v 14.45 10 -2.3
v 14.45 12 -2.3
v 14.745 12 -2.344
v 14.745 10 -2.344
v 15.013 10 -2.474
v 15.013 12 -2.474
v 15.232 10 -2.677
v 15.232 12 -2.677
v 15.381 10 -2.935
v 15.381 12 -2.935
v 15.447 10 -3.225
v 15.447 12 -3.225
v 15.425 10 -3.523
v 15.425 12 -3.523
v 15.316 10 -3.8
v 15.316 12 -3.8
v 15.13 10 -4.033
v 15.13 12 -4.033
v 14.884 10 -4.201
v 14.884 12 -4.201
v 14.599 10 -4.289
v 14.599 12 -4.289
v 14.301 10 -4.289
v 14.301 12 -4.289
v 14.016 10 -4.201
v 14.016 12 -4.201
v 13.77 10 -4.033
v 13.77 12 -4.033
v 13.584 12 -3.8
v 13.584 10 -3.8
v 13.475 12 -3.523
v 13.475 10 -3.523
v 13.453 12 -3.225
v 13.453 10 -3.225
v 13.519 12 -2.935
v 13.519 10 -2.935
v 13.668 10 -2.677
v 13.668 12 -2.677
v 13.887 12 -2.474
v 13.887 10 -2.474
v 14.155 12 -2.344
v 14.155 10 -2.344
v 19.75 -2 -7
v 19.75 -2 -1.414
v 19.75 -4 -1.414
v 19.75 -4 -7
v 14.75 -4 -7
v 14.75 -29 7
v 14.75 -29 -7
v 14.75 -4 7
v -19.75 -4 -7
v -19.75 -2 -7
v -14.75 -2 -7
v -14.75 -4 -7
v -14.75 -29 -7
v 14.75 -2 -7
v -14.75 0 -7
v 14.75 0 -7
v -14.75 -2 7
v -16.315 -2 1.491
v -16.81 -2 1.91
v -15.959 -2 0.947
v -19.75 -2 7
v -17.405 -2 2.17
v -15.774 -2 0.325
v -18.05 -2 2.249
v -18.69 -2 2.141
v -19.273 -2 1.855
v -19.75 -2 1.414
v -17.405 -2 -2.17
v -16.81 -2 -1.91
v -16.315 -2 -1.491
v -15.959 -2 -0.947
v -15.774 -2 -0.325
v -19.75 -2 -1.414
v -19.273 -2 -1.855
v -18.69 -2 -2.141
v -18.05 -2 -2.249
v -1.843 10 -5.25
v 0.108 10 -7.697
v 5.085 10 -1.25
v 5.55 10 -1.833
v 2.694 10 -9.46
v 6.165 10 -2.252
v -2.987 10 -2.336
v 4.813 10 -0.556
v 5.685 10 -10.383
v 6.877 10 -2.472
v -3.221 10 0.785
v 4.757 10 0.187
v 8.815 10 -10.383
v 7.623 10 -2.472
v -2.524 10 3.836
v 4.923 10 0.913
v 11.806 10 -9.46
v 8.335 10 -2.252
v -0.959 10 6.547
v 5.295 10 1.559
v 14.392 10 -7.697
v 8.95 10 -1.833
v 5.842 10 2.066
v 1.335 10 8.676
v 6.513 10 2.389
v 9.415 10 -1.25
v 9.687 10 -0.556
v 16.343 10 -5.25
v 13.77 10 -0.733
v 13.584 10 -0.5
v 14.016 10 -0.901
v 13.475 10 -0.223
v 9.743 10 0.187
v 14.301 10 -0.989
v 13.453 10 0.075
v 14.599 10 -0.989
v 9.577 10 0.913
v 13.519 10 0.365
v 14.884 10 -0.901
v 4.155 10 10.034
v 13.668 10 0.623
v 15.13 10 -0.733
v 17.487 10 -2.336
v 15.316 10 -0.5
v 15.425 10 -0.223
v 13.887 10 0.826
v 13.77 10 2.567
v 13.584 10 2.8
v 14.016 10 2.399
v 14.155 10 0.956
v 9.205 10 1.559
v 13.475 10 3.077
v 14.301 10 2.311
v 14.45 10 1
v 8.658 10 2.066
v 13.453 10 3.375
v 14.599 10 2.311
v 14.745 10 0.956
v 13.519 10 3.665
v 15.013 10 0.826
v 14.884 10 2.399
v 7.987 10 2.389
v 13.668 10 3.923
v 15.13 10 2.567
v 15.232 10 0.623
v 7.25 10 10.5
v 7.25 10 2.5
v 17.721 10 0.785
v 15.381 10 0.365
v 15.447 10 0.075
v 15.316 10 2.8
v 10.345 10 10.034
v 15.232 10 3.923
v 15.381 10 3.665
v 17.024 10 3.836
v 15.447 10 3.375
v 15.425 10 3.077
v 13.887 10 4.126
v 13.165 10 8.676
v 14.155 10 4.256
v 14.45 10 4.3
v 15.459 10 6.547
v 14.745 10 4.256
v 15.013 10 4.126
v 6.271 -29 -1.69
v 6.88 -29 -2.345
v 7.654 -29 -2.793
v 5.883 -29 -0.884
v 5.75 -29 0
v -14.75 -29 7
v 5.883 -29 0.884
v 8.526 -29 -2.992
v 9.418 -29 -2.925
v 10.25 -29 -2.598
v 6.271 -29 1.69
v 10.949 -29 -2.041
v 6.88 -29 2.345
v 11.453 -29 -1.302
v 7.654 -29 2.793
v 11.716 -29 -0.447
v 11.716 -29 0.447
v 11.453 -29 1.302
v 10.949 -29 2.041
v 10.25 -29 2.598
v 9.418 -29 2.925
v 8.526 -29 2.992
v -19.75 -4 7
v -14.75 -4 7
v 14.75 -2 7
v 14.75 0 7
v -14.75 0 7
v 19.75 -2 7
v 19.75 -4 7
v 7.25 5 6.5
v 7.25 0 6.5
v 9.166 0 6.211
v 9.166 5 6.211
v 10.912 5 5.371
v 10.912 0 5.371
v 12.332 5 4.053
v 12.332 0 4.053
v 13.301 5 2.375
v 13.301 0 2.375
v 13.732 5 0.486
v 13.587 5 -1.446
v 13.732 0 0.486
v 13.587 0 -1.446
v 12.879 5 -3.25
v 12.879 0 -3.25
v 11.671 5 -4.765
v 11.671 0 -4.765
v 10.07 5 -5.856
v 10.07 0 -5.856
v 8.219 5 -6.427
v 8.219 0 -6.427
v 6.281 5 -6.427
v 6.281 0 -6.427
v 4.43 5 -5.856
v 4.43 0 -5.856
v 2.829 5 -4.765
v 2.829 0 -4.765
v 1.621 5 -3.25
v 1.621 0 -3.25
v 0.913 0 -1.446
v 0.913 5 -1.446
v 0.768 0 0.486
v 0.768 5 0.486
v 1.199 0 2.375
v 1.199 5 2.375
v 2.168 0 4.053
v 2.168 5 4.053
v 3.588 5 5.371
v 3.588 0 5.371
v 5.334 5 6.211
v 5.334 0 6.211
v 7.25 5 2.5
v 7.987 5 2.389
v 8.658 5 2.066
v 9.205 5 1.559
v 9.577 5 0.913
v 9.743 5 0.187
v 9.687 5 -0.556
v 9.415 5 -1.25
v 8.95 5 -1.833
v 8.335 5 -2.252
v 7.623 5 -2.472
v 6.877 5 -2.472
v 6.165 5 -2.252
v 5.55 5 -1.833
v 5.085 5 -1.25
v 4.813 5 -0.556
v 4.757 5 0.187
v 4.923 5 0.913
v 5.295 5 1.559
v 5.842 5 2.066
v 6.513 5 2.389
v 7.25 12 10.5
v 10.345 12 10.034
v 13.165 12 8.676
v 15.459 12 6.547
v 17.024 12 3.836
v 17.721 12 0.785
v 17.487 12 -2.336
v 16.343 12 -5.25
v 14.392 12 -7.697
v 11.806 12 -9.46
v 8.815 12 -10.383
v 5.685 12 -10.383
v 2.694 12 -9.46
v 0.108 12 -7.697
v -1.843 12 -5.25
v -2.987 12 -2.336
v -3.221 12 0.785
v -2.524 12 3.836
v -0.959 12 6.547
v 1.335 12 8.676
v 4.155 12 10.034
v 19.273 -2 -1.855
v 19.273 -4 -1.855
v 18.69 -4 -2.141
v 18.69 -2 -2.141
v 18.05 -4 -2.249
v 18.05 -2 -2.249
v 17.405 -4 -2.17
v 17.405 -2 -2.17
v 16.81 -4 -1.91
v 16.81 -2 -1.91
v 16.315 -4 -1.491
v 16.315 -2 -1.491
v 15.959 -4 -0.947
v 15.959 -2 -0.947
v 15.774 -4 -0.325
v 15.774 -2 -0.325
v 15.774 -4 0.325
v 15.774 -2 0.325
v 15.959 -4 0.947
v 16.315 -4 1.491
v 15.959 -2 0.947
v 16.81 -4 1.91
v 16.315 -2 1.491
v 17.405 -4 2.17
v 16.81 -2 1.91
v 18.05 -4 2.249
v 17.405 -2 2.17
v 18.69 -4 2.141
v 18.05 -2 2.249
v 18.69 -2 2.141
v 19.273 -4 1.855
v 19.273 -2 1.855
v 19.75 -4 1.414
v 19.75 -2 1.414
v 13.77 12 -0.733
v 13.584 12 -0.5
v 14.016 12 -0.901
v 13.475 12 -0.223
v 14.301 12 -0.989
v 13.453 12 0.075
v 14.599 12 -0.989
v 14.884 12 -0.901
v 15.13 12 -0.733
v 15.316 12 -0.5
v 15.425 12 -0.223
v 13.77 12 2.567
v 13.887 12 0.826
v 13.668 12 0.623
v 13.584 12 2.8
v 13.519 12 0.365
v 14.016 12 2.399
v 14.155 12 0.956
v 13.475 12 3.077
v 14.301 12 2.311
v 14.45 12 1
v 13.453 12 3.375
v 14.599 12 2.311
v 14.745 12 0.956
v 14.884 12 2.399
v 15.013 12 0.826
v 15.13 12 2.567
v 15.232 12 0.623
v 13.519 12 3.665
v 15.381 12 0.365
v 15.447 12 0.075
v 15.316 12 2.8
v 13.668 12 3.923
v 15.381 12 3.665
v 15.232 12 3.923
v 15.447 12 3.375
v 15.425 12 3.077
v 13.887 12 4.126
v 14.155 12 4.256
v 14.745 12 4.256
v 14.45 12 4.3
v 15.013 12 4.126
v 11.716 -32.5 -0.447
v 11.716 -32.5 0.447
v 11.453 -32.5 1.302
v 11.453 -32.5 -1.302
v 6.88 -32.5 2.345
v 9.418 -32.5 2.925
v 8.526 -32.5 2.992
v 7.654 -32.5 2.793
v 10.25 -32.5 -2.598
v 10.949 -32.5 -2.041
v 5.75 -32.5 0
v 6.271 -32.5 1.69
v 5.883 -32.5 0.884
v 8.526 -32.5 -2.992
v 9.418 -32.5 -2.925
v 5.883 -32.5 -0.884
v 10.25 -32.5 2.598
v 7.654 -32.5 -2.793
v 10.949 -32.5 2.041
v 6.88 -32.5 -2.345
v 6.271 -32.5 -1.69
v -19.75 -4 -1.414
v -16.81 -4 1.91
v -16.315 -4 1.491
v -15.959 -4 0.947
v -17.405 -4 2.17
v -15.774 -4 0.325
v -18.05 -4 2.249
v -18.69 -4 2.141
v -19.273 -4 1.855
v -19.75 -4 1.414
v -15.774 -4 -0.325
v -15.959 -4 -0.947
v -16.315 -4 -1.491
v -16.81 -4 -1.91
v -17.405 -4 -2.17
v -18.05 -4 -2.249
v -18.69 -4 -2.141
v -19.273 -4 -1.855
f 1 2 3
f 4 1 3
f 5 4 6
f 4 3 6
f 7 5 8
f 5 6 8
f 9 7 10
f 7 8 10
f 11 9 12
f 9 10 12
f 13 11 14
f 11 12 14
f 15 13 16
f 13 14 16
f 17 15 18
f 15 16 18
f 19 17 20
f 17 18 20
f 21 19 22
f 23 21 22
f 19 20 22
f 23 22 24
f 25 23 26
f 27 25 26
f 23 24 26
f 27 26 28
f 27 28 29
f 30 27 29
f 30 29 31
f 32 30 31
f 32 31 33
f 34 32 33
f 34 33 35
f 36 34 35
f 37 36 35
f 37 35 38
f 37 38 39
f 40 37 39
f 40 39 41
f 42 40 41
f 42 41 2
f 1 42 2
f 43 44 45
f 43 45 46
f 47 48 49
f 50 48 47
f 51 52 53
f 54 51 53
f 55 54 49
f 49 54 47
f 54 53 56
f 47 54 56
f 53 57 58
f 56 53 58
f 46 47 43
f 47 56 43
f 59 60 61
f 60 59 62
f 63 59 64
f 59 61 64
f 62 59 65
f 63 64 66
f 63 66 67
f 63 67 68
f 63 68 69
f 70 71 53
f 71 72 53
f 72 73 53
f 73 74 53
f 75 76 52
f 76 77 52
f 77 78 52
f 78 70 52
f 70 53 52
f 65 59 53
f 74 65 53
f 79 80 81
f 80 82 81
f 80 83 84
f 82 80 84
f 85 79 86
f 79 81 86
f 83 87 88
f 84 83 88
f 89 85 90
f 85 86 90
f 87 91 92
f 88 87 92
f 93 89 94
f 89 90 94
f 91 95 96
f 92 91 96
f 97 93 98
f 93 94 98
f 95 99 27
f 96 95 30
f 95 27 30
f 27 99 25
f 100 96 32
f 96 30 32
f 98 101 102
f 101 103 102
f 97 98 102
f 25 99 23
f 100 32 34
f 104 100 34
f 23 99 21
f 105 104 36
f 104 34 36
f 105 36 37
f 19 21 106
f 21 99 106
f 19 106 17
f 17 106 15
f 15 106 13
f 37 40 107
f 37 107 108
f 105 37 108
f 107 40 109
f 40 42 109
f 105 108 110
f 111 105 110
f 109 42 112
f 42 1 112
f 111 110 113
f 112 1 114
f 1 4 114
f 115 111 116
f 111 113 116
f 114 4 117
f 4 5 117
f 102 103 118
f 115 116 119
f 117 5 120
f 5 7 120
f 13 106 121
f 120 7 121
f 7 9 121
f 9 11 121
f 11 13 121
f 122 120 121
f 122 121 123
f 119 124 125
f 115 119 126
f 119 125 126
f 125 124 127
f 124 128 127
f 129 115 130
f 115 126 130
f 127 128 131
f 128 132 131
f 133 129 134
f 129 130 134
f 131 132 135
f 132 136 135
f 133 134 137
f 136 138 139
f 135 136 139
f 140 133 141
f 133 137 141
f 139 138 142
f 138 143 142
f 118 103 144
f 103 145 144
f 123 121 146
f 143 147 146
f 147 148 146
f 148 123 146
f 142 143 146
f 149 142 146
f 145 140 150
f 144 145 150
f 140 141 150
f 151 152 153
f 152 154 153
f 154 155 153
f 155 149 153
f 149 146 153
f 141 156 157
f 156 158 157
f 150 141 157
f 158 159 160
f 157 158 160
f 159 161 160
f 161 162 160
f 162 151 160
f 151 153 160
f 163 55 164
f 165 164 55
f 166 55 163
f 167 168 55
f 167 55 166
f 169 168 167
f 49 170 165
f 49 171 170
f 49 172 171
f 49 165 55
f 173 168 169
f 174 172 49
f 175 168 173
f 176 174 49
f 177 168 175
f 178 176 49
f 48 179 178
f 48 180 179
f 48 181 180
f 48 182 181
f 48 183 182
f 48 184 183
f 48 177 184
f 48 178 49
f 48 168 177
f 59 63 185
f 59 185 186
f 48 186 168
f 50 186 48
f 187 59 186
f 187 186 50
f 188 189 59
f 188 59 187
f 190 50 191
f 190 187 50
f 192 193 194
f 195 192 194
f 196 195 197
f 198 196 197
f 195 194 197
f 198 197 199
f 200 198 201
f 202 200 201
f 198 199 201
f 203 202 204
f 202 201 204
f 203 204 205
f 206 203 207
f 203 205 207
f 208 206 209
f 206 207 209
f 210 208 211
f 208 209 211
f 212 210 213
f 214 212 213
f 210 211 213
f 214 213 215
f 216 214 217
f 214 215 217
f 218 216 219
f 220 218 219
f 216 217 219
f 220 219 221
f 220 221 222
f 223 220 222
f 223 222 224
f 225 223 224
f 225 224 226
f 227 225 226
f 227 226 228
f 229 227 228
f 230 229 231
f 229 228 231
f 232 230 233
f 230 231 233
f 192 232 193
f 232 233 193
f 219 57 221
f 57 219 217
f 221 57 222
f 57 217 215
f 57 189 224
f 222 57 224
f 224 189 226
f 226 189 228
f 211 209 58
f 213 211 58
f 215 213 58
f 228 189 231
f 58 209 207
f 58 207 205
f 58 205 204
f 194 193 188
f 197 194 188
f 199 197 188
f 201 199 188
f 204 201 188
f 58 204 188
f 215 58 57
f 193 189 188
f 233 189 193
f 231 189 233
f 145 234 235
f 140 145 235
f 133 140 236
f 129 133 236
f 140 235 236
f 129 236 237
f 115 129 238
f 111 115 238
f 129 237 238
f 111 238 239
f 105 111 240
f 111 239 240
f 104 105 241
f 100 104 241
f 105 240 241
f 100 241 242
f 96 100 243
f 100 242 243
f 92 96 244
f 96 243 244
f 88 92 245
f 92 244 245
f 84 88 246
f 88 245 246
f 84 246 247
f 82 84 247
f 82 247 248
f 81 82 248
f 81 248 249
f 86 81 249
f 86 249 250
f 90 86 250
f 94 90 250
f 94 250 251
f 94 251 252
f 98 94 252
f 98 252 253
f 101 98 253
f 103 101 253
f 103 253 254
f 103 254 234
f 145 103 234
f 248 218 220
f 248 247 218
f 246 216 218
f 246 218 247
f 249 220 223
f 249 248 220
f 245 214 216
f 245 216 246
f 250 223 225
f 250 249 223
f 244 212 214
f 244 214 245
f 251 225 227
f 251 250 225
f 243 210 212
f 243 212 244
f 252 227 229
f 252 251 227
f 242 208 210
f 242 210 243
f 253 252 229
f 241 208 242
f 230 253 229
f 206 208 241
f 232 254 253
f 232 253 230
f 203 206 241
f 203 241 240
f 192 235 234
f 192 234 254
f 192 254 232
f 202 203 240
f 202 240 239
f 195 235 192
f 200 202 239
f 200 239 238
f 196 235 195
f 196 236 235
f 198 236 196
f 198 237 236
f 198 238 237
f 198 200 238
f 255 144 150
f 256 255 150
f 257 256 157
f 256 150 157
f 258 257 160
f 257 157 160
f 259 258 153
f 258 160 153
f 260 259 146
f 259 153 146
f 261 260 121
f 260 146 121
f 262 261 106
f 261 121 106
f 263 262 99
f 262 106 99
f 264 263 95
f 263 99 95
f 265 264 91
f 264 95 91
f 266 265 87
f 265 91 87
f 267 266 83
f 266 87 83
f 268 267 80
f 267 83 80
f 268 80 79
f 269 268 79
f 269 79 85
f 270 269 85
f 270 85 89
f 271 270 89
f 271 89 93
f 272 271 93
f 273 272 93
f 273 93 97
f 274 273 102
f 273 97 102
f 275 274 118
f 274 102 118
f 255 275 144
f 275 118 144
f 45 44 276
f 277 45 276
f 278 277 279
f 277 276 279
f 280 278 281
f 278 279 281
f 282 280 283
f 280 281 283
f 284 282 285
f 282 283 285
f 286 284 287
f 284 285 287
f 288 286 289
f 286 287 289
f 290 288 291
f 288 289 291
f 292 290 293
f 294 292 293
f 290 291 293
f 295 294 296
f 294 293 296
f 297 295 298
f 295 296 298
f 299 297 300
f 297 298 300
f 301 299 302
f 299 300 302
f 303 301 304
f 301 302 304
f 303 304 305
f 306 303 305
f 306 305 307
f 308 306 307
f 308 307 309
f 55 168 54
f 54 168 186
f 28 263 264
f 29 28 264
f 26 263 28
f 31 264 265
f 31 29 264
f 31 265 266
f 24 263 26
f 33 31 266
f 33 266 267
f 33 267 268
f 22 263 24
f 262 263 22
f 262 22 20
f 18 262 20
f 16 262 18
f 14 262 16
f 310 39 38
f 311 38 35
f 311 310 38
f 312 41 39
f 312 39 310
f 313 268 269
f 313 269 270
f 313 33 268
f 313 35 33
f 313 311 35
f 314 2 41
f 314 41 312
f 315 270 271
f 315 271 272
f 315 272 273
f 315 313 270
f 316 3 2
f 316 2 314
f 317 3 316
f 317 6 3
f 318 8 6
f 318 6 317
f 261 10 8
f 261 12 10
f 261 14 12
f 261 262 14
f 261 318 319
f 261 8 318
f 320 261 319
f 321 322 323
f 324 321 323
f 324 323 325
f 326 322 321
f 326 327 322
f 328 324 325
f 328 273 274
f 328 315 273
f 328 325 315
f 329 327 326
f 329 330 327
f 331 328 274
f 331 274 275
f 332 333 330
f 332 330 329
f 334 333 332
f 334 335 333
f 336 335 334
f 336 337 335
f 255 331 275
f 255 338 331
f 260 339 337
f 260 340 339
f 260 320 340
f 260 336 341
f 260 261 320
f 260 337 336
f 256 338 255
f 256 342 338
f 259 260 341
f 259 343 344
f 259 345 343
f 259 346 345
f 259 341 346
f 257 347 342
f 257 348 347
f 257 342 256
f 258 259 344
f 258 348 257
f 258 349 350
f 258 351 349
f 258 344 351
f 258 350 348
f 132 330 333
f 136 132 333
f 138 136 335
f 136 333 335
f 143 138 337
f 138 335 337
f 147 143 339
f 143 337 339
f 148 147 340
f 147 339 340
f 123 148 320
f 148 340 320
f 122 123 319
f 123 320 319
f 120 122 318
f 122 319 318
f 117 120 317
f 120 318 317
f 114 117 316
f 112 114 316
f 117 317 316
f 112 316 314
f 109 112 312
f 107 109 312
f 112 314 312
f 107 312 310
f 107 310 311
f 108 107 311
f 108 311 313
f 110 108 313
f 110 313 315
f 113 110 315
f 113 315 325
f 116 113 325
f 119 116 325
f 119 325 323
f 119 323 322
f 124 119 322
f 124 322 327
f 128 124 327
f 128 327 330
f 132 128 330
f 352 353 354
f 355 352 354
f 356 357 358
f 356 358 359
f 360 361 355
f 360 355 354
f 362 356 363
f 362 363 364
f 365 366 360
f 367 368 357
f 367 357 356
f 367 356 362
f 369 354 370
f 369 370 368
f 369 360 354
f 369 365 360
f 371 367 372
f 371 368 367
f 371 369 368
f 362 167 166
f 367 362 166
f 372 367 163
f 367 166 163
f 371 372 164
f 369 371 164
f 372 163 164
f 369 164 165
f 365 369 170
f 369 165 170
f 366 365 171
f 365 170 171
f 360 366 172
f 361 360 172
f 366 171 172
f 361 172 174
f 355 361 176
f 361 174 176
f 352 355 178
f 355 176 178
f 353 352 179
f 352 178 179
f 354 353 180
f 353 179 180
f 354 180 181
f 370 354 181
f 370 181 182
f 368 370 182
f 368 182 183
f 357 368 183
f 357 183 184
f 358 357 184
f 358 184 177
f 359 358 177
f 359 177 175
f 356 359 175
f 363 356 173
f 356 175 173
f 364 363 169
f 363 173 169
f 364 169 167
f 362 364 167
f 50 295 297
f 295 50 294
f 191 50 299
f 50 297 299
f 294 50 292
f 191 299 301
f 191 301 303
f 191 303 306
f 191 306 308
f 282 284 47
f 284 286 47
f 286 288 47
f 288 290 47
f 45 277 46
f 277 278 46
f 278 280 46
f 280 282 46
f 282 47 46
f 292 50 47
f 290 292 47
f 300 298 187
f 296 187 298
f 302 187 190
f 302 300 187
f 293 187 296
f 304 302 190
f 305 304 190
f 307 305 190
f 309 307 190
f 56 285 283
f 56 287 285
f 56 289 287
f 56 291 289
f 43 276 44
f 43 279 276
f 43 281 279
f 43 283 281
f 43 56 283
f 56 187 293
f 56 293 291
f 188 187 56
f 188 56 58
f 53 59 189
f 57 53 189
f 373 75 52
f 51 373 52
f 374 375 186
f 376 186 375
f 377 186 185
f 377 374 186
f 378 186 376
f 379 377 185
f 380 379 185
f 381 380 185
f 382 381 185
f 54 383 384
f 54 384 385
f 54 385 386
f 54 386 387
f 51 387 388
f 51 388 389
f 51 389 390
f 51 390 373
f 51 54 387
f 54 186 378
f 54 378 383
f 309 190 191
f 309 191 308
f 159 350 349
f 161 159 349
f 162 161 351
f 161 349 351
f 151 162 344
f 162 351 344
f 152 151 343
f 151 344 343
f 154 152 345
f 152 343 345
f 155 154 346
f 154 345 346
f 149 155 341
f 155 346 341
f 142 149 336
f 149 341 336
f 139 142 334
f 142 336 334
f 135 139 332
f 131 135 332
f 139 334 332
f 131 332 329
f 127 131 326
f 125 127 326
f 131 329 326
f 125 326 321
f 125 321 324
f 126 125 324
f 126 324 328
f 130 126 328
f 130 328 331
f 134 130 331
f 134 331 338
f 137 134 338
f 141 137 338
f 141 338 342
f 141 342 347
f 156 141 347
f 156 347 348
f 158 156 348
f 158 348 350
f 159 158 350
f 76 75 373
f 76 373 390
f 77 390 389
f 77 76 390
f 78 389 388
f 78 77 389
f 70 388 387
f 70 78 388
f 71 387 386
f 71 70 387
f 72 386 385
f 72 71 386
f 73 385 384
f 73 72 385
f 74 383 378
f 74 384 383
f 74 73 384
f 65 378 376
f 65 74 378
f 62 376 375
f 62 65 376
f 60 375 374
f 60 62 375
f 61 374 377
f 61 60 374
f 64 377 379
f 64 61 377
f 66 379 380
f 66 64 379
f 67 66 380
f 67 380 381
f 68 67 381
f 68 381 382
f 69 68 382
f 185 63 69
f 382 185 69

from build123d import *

# Parameters (mm, degrees)
SKETCH_1_W          = 29.5
SKETCH_1_H          = 29
EXTRUDE_1_DEPTH     = 7
SKETCH_2_W          = 5
SKETCH_2_H          = 14
EXTRUDE_2_DEPTH     = 2
SKETCH_3_R          = 2.25
CUT_EXTRUDE_1_DEPTH = 35.176929353
SKETCH_4_R          = 6.5
SKETCH_4_R_2        = 2.5
EXTRUDE_3_DEPTH     = 5
SKETCH_5_R          = 3
EXTRUDE_4_DEPTH     = 3.5
EXTRUDE_START       = 10
SKETCH_4_3_R        = 10.5
EXTRUDE_5_DEPTH     = 2
SKETCH_4_4_R        = 2.5
EXTRUDE_6_DEPTH     = 10
CUT_EXTRUDE_2_REACH = 51.805
SKETCH_6_R          = 1


with BuildPart() as part:
    # 스케치1 → 보스-돌출1 (new, symmetric)
    with BuildSketch(Plane.XY):
        with Locations((0, -14.5)):
            Rectangle(SKETCH_1_W, SKETCH_1_H)
    extrude(amount=EXTRUDE_1_DEPTH, both=True)

    # 스케치2 → 보스-돌출2 (add)
    with BuildSketch(Plane(origin=(0, -2, 0), x_dir=(1, 0, 0), z_dir=(0, 1, 0))):
        with Locations((17.25, 0)):
            Rectangle(SKETCH_2_W, SKETCH_2_H)
    extrude_2 = extrude(amount=-EXTRUDE_2_DEPTH)

    # 스케치3 → 컷-돌출1 (cut, through all)
    with BuildSketch(Plane(origin=(0, -2, 0), x_dir=(1, 0, 0), z_dir=(0, 1, 0))):
        with Locations((18, 0)):
            Circle(SKETCH_3_R)
    cut_extrude_1 = extrude(amount=-CUT_EXTRUDE_1_DEPTH, mode=Mode.SUBTRACT)

    # 스케치4 → 보스-돌출3 (add)
    with BuildSketch(Plane(origin=(0, 0, 0), x_dir=(1, 0, 0), z_dir=(0, 1, 0))):
        with Locations(Location((7.25, 0, 0), (0, 0, 270))):
            Circle(SKETCH_4_R)
        with Locations(Location((7.25, 0, 0), (0, 0, 270))):
            Circle(SKETCH_4_R_2, mode=Mode.SUBTRACT)
    extrude(amount=EXTRUDE_3_DEPTH)

    # 대칭 복사1: 보스-돌출2, 컷-돌출1 across plane
    add(extrude_2.mirror(Plane(origin=(0, 0, 0), x_dir=(0, 0, 1), z_dir=(1, 0, 0))))
    add(cut_extrude_1.mirror(Plane(origin=(0, 0, 0), x_dir=(0, 0, 1), z_dir=(1, 0, 0))), mode=Mode.SUBTRACT)

    # 스케치5 → 보스-돌출4 (add)
    with BuildSketch(Plane.XZ.offset(29)):
        with Locations(Location((8.75, 0, 0), (0, 0, 180))):
            Circle(SKETCH_5_R)
    extrude(amount=EXTRUDE_4_DEPTH)



with BuildPart() as body_2:
    # 스케치4<3> → 보스-돌출5 (new body)
    with BuildSketch(Plane(origin=(0, 0, 0), x_dir=(1, 0, 0), z_dir=(0, 1, 0)).offset(EXTRUDE_START)):
        with Locations(Location((7.25, 0, 0), (0, 0, 270))):
            Circle(SKETCH_4_3_R)
    extrude(amount=EXTRUDE_5_DEPTH)


with BuildPart() as part_1:
    add(part.part)

    add(body_2.part)  # 보스-돌출6 merges body 2
    # 스케치4<4> → 보스-돌출6 (add)
    with BuildSketch(Plane(origin=(0, 0, 0), x_dir=(1, 0, 0), z_dir=(0, 1, 0))):
        with Locations(Location((7.25, 0, 0), (0, 0, 270))):
            Circle(SKETCH_4_4_R)
    extrude(amount=EXTRUDE_6_DEPTH)

    # 스케치6 → 컷-돌출2 (cut, up to next)
    with BuildSketch(Plane(origin=(0, 12, 0), x_dir=(1, 0, 0), z_dir=(0, 1, 0)), mode=Mode.PRIVATE) as cut_extrude_2_sk1:
        with Locations(Location((14.45, 3.3, 0), (0, 0, 270))):
            Circle(SKETCH_6_R)
    cut_extrude_2_tool1 = extrude(cut_extrude_2_sk1.sketch, amount=-CUT_EXTRUDE_2_REACH, mode=Mode.PRIVATE) & part_1.part
    # 스케치6 → 컷-돌출2 (cut, up to next)
    with BuildSketch(Plane(origin=(0, 12, 0), x_dir=(1, 0, 0), z_dir=(0, 1, 0)), mode=Mode.PRIVATE) as cut_extrude_2_sk2:
        with Locations(Location((14.45, 0, 0), (0, 0, 270))):
            Circle(SKETCH_6_R)
    cut_extrude_2_tool2 = extrude(cut_extrude_2_sk2.sketch, amount=-CUT_EXTRUDE_2_REACH, mode=Mode.PRIVATE) & part_1.part
    # 스케치6 → 컷-돌출2 (cut, up to next)
    with BuildSketch(Plane(origin=(0, 12, 0), x_dir=(1, 0, 0), z_dir=(0, 1, 0)), mode=Mode.PRIVATE) as cut_extrude_2_sk3:
        with Locations(Location((14.45, -3.3, 0), (0, 0, 270))):
            Circle(SKETCH_6_R)
    cut_extrude_2_tool3 = extrude(cut_extrude_2_sk3.sketch, amount=-CUT_EXTRUDE_2_REACH, mode=Mode.PRIVATE) & part_1.part
    add(cut_extrude_2_tool1.solids().sort_by_distance((14.45, 12, -3.3))[0], mode=Mode.SUBTRACT)
    add(cut_extrude_2_tool2.solids().sort_by_distance((14.45, 12, 0))[0], mode=Mode.SUBTRACT)
    add(cut_extrude_2_tool3.solids().sort_by_distance((14.45, 12, 3.3))[0], mode=Mode.SUBTRACT)


solid = part_1.part
